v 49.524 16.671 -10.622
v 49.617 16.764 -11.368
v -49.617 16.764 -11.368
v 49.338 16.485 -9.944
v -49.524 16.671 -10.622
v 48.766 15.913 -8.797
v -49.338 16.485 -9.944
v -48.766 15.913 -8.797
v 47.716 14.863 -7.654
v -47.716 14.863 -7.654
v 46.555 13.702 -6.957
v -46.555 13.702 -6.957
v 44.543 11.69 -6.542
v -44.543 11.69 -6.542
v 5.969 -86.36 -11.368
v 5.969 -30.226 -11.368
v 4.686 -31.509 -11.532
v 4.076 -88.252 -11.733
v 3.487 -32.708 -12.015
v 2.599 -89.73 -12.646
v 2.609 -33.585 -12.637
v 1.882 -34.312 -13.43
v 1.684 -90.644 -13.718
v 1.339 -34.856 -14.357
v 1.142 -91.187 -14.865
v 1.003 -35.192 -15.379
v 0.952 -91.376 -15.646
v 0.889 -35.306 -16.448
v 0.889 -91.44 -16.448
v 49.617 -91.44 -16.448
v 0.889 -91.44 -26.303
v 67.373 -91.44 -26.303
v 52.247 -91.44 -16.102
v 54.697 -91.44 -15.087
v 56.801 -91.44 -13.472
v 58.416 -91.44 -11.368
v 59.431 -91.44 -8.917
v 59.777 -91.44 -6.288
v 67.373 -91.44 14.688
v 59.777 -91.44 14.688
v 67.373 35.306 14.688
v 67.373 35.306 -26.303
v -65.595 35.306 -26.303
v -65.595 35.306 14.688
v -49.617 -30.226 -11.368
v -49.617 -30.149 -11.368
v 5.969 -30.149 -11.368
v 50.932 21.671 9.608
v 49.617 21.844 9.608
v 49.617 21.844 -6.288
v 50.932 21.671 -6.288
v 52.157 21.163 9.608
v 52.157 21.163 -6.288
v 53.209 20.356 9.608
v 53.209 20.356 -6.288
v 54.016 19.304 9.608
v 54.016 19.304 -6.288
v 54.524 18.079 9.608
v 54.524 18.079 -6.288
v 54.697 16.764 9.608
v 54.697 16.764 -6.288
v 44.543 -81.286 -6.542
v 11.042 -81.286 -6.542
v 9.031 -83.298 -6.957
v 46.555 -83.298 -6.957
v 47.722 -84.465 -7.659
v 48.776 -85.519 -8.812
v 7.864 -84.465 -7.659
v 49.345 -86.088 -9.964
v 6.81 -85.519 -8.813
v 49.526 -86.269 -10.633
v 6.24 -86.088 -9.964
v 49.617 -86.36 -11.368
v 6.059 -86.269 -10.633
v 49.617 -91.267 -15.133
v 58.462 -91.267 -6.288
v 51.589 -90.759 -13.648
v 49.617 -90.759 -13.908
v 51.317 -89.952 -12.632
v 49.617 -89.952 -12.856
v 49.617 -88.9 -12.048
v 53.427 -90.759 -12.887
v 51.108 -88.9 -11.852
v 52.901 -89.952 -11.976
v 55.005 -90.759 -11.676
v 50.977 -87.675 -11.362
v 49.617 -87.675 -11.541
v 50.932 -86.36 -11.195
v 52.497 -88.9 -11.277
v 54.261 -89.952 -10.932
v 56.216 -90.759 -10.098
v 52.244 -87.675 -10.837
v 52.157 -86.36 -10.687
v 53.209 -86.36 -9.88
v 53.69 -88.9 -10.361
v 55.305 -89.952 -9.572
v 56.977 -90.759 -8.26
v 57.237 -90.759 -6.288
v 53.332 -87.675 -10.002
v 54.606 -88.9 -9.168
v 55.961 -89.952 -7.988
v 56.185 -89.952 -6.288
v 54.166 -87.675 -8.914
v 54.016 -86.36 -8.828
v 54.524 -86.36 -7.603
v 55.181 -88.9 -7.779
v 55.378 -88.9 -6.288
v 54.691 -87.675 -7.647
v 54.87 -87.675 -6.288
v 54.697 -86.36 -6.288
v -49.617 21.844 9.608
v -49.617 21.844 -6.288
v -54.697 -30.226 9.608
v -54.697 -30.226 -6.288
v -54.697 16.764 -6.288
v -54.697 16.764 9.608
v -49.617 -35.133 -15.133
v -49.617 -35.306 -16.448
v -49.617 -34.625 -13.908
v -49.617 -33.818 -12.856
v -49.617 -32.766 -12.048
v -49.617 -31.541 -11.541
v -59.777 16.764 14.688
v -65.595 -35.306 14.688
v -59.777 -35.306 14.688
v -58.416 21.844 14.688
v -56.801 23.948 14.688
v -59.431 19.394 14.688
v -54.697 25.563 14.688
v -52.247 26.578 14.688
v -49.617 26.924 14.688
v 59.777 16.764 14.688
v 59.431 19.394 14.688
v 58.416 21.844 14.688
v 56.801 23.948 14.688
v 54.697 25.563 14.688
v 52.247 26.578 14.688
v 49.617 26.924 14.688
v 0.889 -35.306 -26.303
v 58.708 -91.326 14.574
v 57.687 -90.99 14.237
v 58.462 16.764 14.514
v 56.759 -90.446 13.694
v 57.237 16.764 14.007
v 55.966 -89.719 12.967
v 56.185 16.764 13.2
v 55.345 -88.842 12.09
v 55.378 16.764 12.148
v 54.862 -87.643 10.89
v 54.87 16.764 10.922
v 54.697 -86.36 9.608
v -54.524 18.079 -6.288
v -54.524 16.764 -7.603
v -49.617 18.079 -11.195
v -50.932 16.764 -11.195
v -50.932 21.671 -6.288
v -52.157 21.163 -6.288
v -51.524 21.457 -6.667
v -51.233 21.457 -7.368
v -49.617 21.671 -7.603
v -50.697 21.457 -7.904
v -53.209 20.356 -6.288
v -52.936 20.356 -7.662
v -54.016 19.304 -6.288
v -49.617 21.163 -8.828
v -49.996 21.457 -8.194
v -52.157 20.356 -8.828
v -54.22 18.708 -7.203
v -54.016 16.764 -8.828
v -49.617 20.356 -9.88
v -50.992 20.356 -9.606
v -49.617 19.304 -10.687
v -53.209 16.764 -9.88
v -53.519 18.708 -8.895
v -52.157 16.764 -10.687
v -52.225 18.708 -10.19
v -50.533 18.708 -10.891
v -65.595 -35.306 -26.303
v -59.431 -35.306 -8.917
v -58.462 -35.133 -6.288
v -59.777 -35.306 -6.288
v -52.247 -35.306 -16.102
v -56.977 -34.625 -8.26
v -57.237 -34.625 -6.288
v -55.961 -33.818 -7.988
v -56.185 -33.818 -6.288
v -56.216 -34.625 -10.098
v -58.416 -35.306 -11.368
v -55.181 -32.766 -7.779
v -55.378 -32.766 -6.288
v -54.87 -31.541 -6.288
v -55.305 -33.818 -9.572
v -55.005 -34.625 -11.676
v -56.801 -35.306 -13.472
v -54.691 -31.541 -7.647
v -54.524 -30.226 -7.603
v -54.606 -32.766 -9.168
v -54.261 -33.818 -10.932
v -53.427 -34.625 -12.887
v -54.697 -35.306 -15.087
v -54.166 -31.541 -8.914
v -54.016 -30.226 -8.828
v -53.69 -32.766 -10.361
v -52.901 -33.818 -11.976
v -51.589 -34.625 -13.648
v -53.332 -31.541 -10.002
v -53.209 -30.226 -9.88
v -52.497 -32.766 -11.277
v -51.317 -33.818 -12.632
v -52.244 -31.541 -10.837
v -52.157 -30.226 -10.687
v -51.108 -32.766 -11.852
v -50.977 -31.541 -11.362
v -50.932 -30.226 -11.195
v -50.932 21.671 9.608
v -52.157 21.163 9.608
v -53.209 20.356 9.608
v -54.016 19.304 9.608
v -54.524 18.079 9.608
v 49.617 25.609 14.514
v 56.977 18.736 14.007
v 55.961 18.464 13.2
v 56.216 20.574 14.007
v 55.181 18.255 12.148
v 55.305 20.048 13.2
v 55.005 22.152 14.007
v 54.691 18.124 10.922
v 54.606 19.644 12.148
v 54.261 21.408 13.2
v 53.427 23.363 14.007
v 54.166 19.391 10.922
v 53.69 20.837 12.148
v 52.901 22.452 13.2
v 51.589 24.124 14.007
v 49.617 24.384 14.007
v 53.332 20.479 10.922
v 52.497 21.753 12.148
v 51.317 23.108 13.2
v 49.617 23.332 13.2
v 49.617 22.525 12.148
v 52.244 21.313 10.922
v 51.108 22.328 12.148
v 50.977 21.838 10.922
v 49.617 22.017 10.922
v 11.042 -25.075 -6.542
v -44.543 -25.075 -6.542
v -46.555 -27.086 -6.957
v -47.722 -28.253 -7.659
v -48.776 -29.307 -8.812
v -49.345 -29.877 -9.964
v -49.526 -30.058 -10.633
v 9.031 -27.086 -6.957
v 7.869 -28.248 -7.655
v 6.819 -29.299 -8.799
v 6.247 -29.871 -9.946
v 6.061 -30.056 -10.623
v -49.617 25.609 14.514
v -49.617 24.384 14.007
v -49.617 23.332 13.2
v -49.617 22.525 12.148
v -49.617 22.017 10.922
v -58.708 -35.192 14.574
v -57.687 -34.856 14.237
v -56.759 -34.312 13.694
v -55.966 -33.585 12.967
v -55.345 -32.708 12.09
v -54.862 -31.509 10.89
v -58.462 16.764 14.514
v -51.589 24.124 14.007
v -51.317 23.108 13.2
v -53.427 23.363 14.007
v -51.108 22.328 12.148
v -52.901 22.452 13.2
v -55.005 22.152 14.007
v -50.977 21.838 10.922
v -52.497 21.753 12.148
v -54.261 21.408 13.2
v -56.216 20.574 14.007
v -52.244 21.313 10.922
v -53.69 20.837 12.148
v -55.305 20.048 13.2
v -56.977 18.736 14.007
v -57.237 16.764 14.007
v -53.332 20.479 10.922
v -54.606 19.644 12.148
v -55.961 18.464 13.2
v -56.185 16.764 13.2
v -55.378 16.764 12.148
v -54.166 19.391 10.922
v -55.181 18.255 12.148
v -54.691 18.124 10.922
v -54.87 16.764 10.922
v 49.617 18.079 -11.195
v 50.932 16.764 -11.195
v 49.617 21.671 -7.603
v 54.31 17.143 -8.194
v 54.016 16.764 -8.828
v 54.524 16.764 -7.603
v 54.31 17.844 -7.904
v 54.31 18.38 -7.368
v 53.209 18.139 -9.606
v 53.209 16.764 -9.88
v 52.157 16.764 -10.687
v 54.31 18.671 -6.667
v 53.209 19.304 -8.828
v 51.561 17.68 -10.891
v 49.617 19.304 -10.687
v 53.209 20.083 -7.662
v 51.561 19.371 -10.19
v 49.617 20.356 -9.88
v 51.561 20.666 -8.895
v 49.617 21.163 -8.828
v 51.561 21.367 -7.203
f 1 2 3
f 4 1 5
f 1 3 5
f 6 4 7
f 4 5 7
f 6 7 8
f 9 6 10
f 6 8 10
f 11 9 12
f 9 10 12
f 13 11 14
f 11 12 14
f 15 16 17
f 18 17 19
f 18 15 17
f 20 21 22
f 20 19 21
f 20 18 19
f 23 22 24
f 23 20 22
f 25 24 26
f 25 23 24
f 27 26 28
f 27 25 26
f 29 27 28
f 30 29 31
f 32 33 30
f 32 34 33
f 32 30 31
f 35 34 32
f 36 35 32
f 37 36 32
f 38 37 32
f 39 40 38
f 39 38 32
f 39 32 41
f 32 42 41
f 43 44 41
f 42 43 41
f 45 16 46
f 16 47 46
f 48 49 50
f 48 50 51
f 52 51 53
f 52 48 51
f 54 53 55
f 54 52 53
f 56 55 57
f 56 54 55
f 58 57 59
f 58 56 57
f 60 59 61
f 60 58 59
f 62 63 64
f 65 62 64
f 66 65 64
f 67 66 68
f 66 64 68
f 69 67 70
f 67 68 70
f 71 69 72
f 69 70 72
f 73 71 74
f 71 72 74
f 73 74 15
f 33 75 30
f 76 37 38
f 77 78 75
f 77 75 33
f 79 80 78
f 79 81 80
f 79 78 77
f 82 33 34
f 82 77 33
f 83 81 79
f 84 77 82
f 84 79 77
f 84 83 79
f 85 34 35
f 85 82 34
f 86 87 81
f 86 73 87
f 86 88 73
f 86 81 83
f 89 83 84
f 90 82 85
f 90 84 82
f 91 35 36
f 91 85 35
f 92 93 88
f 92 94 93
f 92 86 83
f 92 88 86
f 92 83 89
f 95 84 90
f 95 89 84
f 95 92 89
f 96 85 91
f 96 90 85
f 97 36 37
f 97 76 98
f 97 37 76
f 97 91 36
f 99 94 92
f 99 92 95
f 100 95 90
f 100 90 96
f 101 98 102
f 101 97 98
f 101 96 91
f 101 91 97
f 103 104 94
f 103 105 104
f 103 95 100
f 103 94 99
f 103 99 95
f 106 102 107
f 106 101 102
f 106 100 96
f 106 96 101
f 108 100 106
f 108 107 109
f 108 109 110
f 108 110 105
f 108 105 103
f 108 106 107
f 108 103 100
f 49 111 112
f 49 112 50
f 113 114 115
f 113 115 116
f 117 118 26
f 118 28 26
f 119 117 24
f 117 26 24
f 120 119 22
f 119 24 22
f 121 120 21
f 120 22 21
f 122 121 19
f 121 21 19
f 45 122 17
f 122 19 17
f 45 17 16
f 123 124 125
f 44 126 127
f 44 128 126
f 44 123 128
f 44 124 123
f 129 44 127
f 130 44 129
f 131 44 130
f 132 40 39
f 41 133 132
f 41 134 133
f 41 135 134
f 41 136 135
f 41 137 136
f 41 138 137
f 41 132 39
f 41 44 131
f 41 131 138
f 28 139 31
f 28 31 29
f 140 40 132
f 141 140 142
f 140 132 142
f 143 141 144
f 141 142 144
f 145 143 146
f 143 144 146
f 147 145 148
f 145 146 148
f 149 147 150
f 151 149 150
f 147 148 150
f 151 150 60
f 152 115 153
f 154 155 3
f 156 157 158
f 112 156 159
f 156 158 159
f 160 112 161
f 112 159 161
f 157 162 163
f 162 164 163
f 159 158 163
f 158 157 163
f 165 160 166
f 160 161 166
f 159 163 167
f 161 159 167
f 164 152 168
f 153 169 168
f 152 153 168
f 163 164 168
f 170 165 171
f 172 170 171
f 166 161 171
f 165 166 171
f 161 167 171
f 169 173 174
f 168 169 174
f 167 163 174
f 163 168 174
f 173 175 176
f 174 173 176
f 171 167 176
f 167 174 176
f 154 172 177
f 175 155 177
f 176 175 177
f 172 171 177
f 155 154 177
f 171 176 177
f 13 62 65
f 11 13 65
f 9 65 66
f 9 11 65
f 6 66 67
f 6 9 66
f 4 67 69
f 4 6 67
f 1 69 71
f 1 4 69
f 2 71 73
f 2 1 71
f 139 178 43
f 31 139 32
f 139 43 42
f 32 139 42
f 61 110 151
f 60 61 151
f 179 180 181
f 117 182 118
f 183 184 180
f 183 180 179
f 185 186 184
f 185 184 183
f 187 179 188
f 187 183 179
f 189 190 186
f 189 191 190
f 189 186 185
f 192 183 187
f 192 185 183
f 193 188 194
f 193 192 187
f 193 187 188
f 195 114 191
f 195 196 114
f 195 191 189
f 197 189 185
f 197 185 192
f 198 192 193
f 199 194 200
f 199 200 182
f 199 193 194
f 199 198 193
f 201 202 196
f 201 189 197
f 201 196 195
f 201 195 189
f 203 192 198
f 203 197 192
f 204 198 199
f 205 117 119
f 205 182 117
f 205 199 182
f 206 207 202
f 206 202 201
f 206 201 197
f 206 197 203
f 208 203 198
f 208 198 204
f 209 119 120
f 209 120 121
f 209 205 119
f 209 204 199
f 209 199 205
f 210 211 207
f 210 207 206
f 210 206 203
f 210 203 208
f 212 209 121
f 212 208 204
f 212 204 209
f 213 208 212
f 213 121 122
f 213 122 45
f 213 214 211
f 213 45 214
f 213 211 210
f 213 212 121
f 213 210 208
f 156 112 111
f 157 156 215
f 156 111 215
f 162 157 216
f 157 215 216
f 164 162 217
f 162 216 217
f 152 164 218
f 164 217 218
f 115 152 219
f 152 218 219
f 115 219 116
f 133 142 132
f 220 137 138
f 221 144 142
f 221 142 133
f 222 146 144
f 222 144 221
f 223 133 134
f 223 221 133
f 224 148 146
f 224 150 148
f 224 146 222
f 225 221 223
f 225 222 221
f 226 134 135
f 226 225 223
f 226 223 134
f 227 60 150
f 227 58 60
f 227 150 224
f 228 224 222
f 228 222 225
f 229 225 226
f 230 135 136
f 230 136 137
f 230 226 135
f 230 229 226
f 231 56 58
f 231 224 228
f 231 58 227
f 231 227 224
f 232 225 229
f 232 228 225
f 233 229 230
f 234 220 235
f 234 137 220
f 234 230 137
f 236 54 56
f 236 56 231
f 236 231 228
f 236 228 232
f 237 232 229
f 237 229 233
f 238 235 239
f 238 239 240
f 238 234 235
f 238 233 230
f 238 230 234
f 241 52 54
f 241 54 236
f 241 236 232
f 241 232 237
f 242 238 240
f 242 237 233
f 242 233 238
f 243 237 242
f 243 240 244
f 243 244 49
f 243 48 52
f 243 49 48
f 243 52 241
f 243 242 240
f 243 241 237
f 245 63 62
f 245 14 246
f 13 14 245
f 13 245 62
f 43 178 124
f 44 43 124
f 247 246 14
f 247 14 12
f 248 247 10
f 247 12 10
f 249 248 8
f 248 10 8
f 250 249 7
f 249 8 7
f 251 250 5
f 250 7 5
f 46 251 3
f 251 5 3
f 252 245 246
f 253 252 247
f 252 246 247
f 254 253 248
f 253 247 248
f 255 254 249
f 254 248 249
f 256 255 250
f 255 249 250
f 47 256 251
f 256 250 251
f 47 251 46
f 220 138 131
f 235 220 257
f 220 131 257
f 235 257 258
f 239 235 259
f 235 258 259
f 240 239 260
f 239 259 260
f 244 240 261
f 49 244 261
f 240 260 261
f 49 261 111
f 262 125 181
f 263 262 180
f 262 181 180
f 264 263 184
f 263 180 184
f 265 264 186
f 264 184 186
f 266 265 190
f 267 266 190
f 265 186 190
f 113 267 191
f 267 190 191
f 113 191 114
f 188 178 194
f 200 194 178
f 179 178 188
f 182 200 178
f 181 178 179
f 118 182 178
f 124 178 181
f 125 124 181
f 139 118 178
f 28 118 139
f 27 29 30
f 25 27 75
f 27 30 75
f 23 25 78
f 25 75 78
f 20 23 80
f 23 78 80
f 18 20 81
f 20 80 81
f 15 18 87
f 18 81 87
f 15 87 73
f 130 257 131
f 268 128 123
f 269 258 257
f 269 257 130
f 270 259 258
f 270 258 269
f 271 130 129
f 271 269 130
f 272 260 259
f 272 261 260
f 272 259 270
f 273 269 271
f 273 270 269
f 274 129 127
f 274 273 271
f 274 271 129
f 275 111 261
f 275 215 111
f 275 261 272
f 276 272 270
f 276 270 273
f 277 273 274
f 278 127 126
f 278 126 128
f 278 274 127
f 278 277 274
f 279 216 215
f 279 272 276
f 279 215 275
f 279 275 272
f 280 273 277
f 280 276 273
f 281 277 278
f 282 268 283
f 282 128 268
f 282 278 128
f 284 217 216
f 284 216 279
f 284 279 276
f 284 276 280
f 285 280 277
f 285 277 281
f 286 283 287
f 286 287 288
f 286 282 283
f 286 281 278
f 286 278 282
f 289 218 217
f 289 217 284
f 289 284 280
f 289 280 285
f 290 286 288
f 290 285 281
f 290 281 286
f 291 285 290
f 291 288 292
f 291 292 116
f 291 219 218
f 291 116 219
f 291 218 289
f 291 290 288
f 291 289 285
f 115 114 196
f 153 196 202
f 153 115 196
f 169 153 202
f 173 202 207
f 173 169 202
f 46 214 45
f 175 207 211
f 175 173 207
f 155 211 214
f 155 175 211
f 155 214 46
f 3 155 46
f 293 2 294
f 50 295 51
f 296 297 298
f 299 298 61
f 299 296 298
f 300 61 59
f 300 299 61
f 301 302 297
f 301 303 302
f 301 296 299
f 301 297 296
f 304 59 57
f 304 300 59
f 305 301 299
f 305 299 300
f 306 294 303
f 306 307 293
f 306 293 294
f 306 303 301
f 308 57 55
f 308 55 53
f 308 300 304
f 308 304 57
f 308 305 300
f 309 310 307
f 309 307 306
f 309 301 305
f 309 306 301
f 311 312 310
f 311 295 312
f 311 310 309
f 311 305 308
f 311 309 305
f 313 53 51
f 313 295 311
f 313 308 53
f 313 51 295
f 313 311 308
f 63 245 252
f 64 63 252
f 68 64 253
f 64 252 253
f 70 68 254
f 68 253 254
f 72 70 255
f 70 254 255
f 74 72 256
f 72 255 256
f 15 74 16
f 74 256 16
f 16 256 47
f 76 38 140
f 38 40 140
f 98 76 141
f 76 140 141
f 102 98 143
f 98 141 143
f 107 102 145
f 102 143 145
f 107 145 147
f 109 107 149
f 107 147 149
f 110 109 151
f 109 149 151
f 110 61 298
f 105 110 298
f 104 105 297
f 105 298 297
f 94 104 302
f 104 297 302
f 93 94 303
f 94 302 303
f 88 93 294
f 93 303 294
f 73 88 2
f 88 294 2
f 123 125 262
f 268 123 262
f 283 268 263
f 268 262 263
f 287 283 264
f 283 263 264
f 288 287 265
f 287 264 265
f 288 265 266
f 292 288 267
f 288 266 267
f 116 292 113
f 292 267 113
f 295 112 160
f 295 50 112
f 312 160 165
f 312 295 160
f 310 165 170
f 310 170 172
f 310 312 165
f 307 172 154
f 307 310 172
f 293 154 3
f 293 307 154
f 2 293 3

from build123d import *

# Parameters (mm, degrees)
F0_W          = 132.9678967595
F0_H          = 40.9901021048
F1_DEPTH      = 35.306
F2_W          = 109.3940883875
F2_H          = 52.1104875952
F3_DEPTH      = 57.15
F4_W          = 66.4839483798
F4_H          = 40.9901021048
F5_DEPTH      = 56.134
F6_W          = 53.8083352149
F6_H          = 26.0552437976
F7_DEPTH      = 59.69
F8_F1_R       = 5.08
F8_F2_R       = 5.08
F9_W          = 99.2340883875
F9_H          = 46.9125229284
F10_DEPTH     = 4.826
F11_W         = 43.6483352149
F11_H         = 56.2114770716
F12_DEPTH     = 4.826
F13_T1_DEPTH  = 56.3324502806
F13_T3_DEPTH  = 0.0774771487
F13_T5_DEPTH  = 68.8181149887
F13_T7_DEPTH  = 55.5857531726
F13_T9_DEPTH  = 115.8081150657
F13_T11_DEPTH = 99.2340883875
F13_T13_DEPTH = 59.5966379941
F13_T19_DEPTH = 68.2698682383
F13_T23_DEPTH = 12.7615922144


# Not quite as in the source:
# - a fillet or chamfer that OpenCascade refuses, or shapes differently, is made with other operations: its cross-section is extruded or revolved along the edge and cut away or added


with BuildPart() as f1:
    # F0 (on Front) → F1 (new body, symmetric)
    with BuildSketch(Plane.XZ):
        with Locations((0.8887089789, -5.8075287379)):
            Rectangle(F0_W, F0_H)
    extrude(amount=F1_DEPTH, both=True)

    # F2 (on face) → F3 (cut)
    with BuildSketch(Plane.XZ.offset(35.306)):
        with Locations((0, 14.6875223145)):
            Rectangle(F2_W, F2_H)
    extrude(amount=-F3_DEPTH, mode=Mode.SUBTRACT)

    # F4 (on face) → F5 (join)
    with BuildSketch(Plane.XZ.offset(35.306)):
        with Locations((34.1306831688, -5.8075287379)):
            Rectangle(F4_W, F4_H)
    extrude(amount=F5_DEPTH)

    # F6 (on face) → F7 (cut)
    with BuildSketch(Plane(origin=(0, -35.306, 0), x_dir=(-1, 0, 0), z_dir=(0, 1, 0))):
        with Locations((-27.7928765863, 1.6599004157)):
            Rectangle(F6_W, F6_H)
    extrude(amount=-F7_DEPTH, mode=Mode.SUBTRACT)

    # F8: fillet of radius 5.08 on 11 edges, made by hand

    # F8_f1
    f8_f1_edges = [f1.edges().sort_by_distance(p)[0] for p in [
        (-54.6970441937, -6.731, -11.3677214831),
        (-54.6970441937, 21.844, 1.6599004157),
        (0, 21.844, -11.3677214831),
        (54.6970441937, -34.798, -11.3677214831),
        (54.6970441937, 21.844, 1.6599004157),
    ]]
    fillet(f8_f1_edges, radius=F8_F1_R)

    # F8_f2
    f8_f2_edges = [f1.edges().sort_by_distance(p)[0] for p in [
        (-54.6970441937, -9.271, 14.6875223145),
        (0, 21.844, 14.6875223145),
        (54.6970441937, -37.338, 14.6875223145),
        (-24.3641676074, -35.306, -11.3677214831),
        (0.8887089789, -63.373, -11.3677214831),
        (25.2528765863, -91.44, -11.3677214831),
        (53.2091466422, -91.44, -9.8798239315),
        (-53.2091466422, -35.306, -9.8798239315),
        (53.2091466422, 20.3561024484, 14.6875223145),
        (-53.2091466422, 20.3561024484, 14.6875223145),
    ]]
    fillet(f8_f2_edges, radius=F8_F2_R)

    # F9 (on face) → F10 (join)
    with BuildSketch(Plane.XY.offset(-11.3677214831)):
        with Locations((0, -6.6922614642)):
            Rectangle(F9_W, F9_H)
    extrude(amount=F10_DEPTH)

    # F11 (on face) → F12 (join)
    with BuildSketch(Plane.XY.offset(-11.3677214831)):
        with Locations((27.7928765863, -58.2542614642)):
            Rectangle(F11_W, F11_H)
    extrude(amount=F12_DEPTH)

    # F13: fillet of radius 5.08 on 6 edges, made by hand

    # F13_s2 → F13_t1 (cut)
    with BuildSketch(Plane.YZ.offset(-6.7154060868)):
        with BuildLine():
            ThreePointArc((-81.2863539737, -6.5417214831), (-84.7875023567, -7.9409117896), (-86.36, -11.3677214831))
            Line((-86.36, -11.3677214831), (-86.36, -6.5417214831))
            Line((-86.36, -6.5417214831), (-81.2863539737, -6.5417214831))
        make_face()
    extrude(amount=F13_T1_DEPTH, mode=Mode.SUBTRACT)

    # F13_s4 → F13_t3 (cut)
    with BuildSketch(Plane.XZ.offset(30.1485229284)):
        with BuildLine():
            ThreePointArc((11.0423550052, -6.5417214831), (7.5412066221, -7.9409117896), (5.9687089789, -11.3677214831))
            Line((5.9687089789, -11.3677214831), (5.9687089789, -6.5417214831))
            Line((5.9687089789, -6.5417214831), (11.0423550052, -6.5417214831))
        make_face()
    extrude(amount=F13_T3_DEPTH, mode=Mode.SUBTRACT)

    # F13_s6 → F13_t5 (cut)
    with BuildSketch(Plane.XZ.offset(30.226000077)):
        with BuildLine():
            ThreePointArc((11.0423550052, -6.5417214831), (7.5412066221, -7.9409117896), (5.9687089789, -11.3677214831))
            Line((5.9687089789, -11.3677214831), (5.9687089789, -6.5417214831))
            Line((5.9687089789, -6.5417214831), (11.0423550052, -6.5417214831))
        make_face()
    extrude(amount=F13_T5_DEPTH, mode=Mode.SUBTRACT)

    # F13_s8 → F13_t7 (cut)
    with BuildSketch(Plane.YZ.offset(-49.6170441937)):
        with BuildLine():
            ThreePointArc((-25.0748769021, -6.5417214831), (-28.5760252851, -7.9409117896), (-30.1485229284, -11.3677214831))
            Line((-30.1485229284, -11.3677214831), (-30.1485229284, -6.5417214831))
            Line((-30.1485229284, -6.5417214831), (-25.0748769021, -6.5417214831))
        make_face()
    extrude(amount=F13_T7_DEPTH, mode=Mode.SUBTRACT)

    # F13_s10 → F13_t9 (cut)
    with BuildSketch(Plane.XZ.offset(-16.764)):
        with BuildLine():
            ThreePointArc((44.5433981675, -6.5417214831), (48.0445465505, -7.9409117896), (49.6170441937, -11.3677214831))
            Line((49.6170441937, -11.3677214831), (49.6170441937, -6.5417214831))
            Line((49.6170441937, -6.5417214831), (44.5433981675, -6.5417214831))
        make_face()
    extrude(amount=F13_T9_DEPTH, mode=Mode.SUBTRACT)

    # F13_s12 → F13_t11 (cut)
    with BuildSketch(Plane.YZ.offset(-49.6170441937)):
        with BuildLine():
            ThreePointArc((16.764, -11.3677214831), (15.1915023567, -7.9409117896), (11.6903539737, -6.5417214831))
            Line((11.6903539737, -6.5417214831), (16.764, -6.5417214831))
            Line((16.764, -6.5417214831), (16.764, -11.3677214831))
        make_face()
    extrude(amount=F13_T11_DEPTH, mode=Mode.SUBTRACT)

    # F13_s14 → F13_t13 (cut)
    with BuildSketch(Plane.XZ.offset(-16.764)):
        with BuildLine():
            ThreePointArc((-44.5433981675, -6.5417214831), (-48.0445465505, -7.9409117896), (-49.6170441937, -11.3677214831))
            Line((-49.6170441937, -11.3677214831), (-49.6170441937, -6.5417214831))
            Line((-49.6170441937, -6.5417214831), (-44.5433981675, -6.5417214831))
        make_face()
    extrude(amount=F13_T13_DEPTH, mode=Mode.SUBTRACT)


with BuildPart() as f13_tool17:
    # F13_s18 → F13_t19 (new body)
    with BuildSketch(Plane.YZ.offset(-49.6170441937)):
        with BuildLine():
            ThreePointArc((-25.0748769021, -6.5417214831), (-28.5760252851, -7.9409117896), (-30.1485229284, -11.3677214831))
            Line((-30.1485229284, -11.3677214831), (-30.1485229284, -6.5417214831))
            Line((-30.1485229284, -6.5417214831), (-25.0748769021, -6.5417214831))
        make_face()
    extrude(amount=F13_T19_DEPTH)

    split(bisect_by=Plane.YZ.offset(5.9687089789), keep=Keep.TOP)


with BuildPart() as f13_tool21:
    # F13_s22 → F13_t23 (new body)
    with BuildSketch(Plane.XZ.offset(17.4644078627)):
        with BuildLine():
            ThreePointArc((11.0423550052, -6.5417214831), (7.5412066221, -7.9409117896), (5.9687089789, -11.3677214831))
            Line((5.9687089789, -11.3677214831), (5.9687089789, -6.5417214831))
            Line((5.9687089789, -6.5417214831), (11.0423550052, -6.5417214831))
        make_face()
    extrude(amount=F13_T23_DEPTH)

    split(bisect_by=Plane.XZ.offset(30.1485229284), keep=Keep.BOTTOM)


with BuildPart() as f13_tool17_1:
    add(f13_tool17.part)

    # F13_t25: intersect F13_tool21
    add(f13_tool21.part, mode=Mode.INTERSECT)


with BuildPart() as f1_1:
    add(f1.part)

    # F13_t15: cut F13_tool17
    add(f13_tool17_1.part, mode=Mode.SUBTRACT)


solid = f1_1.part
